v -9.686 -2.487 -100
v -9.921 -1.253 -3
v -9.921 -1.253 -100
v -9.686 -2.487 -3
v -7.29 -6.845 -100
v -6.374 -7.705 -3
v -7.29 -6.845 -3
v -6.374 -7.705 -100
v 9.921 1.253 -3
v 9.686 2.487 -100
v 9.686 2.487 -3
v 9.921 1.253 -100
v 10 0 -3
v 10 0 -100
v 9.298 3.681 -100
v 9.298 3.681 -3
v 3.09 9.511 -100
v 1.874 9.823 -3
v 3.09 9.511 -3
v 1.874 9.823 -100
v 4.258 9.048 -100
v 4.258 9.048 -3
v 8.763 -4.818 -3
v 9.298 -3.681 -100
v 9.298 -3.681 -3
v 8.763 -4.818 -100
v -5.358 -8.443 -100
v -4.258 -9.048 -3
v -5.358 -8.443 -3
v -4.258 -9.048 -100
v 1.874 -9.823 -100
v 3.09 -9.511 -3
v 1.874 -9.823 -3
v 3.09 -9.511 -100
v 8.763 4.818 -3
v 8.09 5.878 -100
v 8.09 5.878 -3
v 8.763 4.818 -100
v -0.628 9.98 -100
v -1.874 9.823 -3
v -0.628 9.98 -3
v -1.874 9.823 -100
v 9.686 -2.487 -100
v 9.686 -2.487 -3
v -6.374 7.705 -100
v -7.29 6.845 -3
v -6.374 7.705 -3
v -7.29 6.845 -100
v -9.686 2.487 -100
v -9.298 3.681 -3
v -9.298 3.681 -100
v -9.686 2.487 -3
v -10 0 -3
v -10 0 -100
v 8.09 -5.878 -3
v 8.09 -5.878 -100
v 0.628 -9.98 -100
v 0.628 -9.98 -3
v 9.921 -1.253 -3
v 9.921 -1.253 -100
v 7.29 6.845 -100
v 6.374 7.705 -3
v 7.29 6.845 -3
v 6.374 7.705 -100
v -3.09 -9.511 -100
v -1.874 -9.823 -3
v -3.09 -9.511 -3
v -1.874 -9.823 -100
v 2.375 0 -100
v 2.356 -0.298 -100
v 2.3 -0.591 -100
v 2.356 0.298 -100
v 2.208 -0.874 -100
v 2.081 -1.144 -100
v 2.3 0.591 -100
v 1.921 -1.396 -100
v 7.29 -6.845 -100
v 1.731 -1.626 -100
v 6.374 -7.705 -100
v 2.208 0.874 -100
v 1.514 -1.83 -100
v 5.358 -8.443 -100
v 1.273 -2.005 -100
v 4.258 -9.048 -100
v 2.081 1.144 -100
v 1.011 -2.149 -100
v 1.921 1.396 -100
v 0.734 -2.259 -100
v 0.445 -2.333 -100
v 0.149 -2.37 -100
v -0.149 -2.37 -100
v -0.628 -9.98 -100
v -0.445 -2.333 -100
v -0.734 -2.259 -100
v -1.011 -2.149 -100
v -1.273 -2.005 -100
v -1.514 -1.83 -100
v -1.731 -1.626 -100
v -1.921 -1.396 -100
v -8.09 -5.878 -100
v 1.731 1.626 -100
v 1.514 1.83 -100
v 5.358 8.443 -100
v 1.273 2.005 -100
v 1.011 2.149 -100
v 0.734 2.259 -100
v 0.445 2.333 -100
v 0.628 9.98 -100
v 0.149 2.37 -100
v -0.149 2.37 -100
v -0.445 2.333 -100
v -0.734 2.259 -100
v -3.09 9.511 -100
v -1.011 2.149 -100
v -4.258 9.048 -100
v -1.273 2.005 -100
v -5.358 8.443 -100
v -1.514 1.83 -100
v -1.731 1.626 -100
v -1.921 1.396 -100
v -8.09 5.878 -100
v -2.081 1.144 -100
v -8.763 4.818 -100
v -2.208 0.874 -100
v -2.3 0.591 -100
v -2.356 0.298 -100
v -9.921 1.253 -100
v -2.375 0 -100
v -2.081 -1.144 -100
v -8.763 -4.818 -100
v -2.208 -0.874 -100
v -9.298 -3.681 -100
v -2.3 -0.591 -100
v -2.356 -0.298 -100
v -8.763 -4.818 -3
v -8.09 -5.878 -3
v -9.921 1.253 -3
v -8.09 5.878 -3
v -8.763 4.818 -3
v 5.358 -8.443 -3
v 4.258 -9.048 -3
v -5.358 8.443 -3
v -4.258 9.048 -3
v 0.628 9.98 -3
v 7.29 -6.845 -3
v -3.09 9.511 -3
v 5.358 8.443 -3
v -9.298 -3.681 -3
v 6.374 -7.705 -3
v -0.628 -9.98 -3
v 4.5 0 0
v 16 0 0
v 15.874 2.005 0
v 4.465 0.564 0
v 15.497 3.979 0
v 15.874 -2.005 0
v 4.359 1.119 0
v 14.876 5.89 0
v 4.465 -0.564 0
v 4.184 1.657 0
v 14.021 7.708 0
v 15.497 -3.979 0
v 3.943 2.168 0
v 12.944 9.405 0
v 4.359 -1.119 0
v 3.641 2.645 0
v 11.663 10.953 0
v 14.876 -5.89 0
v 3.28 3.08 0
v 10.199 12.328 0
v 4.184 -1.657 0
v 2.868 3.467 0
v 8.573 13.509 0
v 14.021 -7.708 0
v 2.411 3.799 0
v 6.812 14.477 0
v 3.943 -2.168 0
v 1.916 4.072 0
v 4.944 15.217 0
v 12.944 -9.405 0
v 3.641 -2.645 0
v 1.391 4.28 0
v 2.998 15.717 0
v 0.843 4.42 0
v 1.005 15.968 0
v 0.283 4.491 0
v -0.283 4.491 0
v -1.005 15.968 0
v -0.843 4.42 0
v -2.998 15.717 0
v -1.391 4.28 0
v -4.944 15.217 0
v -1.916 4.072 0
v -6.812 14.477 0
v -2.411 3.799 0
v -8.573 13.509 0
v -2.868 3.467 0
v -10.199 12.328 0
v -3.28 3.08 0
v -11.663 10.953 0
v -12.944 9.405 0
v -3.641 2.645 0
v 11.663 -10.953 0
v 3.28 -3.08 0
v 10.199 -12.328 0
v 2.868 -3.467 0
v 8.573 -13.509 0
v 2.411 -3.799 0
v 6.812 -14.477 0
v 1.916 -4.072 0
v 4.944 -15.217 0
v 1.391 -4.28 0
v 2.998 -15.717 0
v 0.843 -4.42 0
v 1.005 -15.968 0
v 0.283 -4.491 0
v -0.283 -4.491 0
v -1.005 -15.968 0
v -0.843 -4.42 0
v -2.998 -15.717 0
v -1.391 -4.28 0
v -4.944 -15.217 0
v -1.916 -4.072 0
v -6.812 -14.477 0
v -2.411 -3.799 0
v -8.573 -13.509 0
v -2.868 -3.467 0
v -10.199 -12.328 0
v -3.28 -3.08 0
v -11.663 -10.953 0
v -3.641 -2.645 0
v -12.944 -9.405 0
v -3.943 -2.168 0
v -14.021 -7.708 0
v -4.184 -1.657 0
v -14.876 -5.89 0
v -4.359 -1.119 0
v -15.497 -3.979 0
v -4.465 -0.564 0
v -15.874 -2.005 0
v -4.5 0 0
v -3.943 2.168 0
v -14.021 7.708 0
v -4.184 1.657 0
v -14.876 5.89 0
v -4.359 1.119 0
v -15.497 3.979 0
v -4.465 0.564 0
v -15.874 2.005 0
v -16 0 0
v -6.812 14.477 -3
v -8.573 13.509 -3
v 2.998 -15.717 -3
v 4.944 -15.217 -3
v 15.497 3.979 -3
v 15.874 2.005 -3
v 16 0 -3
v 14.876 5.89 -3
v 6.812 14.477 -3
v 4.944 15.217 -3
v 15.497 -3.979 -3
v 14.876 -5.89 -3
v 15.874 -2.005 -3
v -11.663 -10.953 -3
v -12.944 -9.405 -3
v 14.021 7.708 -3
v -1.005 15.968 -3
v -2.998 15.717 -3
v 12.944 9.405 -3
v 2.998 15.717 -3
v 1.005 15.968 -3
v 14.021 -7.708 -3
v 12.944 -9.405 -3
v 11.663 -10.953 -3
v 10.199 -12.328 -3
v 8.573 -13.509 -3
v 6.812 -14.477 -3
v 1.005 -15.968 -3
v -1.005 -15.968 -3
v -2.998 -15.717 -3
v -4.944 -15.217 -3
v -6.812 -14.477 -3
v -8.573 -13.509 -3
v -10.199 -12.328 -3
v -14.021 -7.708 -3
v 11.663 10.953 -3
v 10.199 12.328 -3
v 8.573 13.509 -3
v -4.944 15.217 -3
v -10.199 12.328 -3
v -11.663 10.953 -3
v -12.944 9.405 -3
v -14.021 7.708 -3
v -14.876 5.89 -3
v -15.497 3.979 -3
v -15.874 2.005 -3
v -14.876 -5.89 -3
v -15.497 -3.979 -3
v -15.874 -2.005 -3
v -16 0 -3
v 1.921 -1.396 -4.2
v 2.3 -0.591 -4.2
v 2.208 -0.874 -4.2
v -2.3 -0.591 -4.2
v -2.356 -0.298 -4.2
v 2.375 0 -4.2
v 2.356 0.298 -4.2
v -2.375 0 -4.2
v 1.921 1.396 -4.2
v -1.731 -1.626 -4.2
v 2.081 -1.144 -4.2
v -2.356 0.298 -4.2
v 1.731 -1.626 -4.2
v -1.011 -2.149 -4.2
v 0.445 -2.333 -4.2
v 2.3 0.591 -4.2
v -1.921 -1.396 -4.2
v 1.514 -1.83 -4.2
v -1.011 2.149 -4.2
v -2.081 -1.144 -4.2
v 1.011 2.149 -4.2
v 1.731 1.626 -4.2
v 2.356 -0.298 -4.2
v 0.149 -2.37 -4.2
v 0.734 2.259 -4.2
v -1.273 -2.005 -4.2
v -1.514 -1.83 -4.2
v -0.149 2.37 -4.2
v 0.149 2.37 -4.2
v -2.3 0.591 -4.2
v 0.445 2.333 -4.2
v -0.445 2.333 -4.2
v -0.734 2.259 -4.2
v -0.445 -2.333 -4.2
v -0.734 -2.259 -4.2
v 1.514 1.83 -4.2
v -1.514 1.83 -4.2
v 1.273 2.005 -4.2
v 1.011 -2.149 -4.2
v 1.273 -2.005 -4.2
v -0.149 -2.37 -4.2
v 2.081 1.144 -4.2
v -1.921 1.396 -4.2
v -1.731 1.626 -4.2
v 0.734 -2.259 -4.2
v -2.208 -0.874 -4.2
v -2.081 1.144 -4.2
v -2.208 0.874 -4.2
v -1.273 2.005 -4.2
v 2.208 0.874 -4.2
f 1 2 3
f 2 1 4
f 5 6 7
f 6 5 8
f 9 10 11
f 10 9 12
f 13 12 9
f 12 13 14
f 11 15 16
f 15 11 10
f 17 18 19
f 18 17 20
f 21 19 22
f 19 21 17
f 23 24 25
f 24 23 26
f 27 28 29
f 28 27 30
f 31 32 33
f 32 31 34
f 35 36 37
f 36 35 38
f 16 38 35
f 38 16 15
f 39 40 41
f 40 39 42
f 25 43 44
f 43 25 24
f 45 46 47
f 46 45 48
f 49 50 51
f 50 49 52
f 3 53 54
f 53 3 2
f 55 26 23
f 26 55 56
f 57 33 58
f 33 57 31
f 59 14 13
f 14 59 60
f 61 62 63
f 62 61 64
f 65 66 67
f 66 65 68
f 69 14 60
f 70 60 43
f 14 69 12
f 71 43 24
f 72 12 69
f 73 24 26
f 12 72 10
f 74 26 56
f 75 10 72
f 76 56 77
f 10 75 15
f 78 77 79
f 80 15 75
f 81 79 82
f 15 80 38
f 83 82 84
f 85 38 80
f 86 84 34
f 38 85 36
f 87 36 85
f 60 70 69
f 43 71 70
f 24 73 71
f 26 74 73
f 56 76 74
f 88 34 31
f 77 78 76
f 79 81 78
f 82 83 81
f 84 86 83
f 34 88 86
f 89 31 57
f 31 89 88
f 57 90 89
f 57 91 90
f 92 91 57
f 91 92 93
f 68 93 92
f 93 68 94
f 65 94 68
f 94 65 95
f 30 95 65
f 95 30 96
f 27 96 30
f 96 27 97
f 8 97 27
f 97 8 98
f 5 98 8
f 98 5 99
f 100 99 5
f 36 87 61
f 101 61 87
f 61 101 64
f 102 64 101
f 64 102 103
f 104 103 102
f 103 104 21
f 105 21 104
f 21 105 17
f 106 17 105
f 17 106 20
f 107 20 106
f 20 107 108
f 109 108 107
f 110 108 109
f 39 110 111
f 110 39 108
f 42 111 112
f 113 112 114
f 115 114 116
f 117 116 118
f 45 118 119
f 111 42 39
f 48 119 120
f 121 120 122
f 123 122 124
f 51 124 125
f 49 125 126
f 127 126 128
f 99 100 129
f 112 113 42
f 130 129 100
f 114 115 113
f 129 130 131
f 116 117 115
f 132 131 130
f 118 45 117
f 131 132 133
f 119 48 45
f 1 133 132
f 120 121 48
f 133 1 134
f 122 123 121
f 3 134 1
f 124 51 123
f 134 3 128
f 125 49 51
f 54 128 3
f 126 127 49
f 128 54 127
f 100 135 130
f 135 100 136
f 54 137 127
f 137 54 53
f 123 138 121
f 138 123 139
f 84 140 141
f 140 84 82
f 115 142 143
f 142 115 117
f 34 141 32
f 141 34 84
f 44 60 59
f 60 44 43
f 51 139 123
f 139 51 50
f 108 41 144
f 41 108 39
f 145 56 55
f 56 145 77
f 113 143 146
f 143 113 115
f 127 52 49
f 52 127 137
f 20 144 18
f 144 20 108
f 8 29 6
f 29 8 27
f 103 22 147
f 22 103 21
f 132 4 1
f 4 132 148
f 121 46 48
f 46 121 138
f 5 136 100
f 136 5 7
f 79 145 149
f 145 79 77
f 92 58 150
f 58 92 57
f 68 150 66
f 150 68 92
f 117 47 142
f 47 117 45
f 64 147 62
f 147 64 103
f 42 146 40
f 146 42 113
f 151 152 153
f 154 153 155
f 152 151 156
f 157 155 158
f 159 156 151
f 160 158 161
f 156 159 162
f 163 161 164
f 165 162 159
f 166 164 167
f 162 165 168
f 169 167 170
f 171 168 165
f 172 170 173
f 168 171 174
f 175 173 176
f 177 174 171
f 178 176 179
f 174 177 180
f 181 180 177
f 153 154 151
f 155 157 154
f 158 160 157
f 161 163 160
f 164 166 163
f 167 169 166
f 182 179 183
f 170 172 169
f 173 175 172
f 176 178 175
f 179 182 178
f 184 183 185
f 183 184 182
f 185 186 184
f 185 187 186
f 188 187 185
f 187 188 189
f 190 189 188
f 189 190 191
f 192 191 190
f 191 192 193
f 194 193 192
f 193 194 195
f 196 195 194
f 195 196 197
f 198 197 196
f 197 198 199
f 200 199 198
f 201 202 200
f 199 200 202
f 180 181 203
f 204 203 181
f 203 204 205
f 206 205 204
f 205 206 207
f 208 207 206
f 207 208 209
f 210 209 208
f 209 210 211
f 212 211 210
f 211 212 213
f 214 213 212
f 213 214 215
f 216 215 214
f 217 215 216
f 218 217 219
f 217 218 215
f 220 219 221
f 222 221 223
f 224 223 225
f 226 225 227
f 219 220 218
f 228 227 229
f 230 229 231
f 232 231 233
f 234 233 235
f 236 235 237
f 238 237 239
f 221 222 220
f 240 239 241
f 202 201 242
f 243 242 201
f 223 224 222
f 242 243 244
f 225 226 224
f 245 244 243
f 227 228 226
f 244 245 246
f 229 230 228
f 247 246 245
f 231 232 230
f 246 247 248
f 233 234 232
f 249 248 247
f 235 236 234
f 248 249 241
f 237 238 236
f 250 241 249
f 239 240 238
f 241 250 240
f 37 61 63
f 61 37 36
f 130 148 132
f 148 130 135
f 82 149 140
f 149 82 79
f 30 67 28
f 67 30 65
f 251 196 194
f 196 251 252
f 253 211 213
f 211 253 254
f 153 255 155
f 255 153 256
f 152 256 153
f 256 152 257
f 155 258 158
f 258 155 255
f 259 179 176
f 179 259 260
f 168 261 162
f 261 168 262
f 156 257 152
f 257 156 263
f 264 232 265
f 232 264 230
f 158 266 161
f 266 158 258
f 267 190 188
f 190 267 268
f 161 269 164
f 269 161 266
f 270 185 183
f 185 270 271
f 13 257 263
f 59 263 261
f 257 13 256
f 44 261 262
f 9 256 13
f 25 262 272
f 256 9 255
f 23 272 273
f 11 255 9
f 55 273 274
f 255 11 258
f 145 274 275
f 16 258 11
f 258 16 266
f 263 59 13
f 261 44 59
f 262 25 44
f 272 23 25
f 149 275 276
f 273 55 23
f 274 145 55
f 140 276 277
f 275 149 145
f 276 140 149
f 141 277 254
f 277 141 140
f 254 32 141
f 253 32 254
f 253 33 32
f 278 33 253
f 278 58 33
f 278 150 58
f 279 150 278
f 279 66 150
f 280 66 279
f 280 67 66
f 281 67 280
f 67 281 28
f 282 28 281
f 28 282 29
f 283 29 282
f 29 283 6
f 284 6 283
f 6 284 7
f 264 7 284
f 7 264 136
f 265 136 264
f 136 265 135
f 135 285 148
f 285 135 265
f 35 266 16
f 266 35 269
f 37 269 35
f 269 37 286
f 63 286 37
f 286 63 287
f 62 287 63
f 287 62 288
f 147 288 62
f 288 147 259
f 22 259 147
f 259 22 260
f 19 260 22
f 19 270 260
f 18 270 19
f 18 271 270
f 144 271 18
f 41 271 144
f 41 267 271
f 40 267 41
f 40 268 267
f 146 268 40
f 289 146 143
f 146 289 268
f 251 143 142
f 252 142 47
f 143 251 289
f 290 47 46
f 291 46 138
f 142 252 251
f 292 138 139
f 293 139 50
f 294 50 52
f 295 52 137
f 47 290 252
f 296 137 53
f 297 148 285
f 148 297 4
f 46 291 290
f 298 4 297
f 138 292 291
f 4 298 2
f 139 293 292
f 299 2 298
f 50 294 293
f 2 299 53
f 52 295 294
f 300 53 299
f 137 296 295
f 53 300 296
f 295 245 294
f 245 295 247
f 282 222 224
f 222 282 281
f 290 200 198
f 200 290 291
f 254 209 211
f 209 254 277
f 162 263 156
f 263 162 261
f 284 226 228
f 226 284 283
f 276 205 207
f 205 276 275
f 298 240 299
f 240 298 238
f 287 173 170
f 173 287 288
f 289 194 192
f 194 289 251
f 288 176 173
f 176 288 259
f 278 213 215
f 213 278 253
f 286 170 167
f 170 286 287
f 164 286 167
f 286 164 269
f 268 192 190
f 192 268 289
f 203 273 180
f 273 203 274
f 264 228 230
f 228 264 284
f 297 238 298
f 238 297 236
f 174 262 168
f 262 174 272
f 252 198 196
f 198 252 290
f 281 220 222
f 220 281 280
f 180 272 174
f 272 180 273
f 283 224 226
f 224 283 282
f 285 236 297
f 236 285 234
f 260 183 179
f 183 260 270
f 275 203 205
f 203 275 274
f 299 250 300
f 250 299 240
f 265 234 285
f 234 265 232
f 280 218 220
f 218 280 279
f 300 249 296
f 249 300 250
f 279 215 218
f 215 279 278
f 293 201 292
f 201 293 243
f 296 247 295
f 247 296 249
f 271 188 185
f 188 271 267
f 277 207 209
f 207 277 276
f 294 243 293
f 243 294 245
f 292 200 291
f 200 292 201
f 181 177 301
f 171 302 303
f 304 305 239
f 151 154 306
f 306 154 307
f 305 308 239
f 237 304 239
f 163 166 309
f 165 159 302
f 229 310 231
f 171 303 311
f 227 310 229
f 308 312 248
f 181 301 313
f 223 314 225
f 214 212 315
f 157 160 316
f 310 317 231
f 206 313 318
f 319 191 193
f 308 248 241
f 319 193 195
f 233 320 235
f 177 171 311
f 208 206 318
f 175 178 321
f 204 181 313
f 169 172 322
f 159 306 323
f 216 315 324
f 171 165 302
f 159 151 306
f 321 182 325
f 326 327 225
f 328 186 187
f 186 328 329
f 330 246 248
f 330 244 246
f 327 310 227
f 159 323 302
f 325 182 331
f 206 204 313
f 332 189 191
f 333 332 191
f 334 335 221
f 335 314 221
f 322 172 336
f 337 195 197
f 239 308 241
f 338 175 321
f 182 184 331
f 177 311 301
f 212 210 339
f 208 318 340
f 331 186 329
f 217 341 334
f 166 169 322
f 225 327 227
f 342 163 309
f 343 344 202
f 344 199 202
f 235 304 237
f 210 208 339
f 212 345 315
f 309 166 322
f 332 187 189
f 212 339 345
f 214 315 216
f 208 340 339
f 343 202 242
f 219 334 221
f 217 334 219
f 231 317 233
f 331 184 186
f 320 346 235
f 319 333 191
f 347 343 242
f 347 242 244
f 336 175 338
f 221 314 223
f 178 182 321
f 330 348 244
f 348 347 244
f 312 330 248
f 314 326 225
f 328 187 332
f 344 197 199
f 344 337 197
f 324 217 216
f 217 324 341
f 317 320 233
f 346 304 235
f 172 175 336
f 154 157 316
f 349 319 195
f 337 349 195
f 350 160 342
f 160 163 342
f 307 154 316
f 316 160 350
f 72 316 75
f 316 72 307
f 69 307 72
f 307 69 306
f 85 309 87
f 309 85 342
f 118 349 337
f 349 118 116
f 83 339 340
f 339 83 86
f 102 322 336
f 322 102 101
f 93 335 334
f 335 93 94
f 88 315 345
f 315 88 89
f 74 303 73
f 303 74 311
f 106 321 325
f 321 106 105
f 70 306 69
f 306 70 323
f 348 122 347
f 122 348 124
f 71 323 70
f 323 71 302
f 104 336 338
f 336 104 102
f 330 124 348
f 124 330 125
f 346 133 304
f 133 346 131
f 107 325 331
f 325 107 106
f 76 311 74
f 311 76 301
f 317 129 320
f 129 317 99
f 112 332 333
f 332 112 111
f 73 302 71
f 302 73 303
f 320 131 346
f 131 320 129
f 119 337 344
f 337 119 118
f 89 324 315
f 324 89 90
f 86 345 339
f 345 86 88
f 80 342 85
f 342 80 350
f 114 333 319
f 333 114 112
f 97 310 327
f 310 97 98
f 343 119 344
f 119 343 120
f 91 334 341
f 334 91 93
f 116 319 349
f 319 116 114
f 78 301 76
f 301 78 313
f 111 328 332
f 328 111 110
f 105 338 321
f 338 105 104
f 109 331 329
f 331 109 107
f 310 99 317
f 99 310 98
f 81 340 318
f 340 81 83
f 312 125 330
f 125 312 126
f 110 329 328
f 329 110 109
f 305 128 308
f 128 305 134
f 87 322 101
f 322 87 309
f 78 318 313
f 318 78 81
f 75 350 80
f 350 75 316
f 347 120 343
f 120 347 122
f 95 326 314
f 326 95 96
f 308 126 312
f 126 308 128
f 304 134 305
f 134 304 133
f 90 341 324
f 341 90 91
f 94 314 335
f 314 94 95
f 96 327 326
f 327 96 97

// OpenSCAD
$fn = 50;


difference() {
	union() {
		translate(v = [0, 0, -100.0000000000]) {
			cylinder(h = 100, r = 10.0000000000);
		}
		translate(v = [0, 0, -3.0000000000]) {
			cylinder(h = 3, r = 16.0000000000);
		}
	}
	union() {
		translate(v = [0, 0, 0]) {
			rotate(a = [0, 0, 0]) {
				difference() {
					union() {
						#translate(v = [0, 0, -100.0000000000]) {
							cylinder(h = 100, r = 2.2500000000);
						}
						#translate(v = [0, 0, -4.2000000000]) {
							cylinder(h = 4.2000000000, r = 10.0000000000, r1 = 2.3750000000, r2 = 4.5000000000);
						}
						#translate(v = [0, 0, -100.0000000000]) {
							cylinder(h = 100, r = 2.3750000000);
						}
						#translate(v = [0, 0, -100.0000000000]) {
							cylinder(h = 100, r = 2.2500000000);
						}
					}
					union();
				}
			}
		}
	}
}
